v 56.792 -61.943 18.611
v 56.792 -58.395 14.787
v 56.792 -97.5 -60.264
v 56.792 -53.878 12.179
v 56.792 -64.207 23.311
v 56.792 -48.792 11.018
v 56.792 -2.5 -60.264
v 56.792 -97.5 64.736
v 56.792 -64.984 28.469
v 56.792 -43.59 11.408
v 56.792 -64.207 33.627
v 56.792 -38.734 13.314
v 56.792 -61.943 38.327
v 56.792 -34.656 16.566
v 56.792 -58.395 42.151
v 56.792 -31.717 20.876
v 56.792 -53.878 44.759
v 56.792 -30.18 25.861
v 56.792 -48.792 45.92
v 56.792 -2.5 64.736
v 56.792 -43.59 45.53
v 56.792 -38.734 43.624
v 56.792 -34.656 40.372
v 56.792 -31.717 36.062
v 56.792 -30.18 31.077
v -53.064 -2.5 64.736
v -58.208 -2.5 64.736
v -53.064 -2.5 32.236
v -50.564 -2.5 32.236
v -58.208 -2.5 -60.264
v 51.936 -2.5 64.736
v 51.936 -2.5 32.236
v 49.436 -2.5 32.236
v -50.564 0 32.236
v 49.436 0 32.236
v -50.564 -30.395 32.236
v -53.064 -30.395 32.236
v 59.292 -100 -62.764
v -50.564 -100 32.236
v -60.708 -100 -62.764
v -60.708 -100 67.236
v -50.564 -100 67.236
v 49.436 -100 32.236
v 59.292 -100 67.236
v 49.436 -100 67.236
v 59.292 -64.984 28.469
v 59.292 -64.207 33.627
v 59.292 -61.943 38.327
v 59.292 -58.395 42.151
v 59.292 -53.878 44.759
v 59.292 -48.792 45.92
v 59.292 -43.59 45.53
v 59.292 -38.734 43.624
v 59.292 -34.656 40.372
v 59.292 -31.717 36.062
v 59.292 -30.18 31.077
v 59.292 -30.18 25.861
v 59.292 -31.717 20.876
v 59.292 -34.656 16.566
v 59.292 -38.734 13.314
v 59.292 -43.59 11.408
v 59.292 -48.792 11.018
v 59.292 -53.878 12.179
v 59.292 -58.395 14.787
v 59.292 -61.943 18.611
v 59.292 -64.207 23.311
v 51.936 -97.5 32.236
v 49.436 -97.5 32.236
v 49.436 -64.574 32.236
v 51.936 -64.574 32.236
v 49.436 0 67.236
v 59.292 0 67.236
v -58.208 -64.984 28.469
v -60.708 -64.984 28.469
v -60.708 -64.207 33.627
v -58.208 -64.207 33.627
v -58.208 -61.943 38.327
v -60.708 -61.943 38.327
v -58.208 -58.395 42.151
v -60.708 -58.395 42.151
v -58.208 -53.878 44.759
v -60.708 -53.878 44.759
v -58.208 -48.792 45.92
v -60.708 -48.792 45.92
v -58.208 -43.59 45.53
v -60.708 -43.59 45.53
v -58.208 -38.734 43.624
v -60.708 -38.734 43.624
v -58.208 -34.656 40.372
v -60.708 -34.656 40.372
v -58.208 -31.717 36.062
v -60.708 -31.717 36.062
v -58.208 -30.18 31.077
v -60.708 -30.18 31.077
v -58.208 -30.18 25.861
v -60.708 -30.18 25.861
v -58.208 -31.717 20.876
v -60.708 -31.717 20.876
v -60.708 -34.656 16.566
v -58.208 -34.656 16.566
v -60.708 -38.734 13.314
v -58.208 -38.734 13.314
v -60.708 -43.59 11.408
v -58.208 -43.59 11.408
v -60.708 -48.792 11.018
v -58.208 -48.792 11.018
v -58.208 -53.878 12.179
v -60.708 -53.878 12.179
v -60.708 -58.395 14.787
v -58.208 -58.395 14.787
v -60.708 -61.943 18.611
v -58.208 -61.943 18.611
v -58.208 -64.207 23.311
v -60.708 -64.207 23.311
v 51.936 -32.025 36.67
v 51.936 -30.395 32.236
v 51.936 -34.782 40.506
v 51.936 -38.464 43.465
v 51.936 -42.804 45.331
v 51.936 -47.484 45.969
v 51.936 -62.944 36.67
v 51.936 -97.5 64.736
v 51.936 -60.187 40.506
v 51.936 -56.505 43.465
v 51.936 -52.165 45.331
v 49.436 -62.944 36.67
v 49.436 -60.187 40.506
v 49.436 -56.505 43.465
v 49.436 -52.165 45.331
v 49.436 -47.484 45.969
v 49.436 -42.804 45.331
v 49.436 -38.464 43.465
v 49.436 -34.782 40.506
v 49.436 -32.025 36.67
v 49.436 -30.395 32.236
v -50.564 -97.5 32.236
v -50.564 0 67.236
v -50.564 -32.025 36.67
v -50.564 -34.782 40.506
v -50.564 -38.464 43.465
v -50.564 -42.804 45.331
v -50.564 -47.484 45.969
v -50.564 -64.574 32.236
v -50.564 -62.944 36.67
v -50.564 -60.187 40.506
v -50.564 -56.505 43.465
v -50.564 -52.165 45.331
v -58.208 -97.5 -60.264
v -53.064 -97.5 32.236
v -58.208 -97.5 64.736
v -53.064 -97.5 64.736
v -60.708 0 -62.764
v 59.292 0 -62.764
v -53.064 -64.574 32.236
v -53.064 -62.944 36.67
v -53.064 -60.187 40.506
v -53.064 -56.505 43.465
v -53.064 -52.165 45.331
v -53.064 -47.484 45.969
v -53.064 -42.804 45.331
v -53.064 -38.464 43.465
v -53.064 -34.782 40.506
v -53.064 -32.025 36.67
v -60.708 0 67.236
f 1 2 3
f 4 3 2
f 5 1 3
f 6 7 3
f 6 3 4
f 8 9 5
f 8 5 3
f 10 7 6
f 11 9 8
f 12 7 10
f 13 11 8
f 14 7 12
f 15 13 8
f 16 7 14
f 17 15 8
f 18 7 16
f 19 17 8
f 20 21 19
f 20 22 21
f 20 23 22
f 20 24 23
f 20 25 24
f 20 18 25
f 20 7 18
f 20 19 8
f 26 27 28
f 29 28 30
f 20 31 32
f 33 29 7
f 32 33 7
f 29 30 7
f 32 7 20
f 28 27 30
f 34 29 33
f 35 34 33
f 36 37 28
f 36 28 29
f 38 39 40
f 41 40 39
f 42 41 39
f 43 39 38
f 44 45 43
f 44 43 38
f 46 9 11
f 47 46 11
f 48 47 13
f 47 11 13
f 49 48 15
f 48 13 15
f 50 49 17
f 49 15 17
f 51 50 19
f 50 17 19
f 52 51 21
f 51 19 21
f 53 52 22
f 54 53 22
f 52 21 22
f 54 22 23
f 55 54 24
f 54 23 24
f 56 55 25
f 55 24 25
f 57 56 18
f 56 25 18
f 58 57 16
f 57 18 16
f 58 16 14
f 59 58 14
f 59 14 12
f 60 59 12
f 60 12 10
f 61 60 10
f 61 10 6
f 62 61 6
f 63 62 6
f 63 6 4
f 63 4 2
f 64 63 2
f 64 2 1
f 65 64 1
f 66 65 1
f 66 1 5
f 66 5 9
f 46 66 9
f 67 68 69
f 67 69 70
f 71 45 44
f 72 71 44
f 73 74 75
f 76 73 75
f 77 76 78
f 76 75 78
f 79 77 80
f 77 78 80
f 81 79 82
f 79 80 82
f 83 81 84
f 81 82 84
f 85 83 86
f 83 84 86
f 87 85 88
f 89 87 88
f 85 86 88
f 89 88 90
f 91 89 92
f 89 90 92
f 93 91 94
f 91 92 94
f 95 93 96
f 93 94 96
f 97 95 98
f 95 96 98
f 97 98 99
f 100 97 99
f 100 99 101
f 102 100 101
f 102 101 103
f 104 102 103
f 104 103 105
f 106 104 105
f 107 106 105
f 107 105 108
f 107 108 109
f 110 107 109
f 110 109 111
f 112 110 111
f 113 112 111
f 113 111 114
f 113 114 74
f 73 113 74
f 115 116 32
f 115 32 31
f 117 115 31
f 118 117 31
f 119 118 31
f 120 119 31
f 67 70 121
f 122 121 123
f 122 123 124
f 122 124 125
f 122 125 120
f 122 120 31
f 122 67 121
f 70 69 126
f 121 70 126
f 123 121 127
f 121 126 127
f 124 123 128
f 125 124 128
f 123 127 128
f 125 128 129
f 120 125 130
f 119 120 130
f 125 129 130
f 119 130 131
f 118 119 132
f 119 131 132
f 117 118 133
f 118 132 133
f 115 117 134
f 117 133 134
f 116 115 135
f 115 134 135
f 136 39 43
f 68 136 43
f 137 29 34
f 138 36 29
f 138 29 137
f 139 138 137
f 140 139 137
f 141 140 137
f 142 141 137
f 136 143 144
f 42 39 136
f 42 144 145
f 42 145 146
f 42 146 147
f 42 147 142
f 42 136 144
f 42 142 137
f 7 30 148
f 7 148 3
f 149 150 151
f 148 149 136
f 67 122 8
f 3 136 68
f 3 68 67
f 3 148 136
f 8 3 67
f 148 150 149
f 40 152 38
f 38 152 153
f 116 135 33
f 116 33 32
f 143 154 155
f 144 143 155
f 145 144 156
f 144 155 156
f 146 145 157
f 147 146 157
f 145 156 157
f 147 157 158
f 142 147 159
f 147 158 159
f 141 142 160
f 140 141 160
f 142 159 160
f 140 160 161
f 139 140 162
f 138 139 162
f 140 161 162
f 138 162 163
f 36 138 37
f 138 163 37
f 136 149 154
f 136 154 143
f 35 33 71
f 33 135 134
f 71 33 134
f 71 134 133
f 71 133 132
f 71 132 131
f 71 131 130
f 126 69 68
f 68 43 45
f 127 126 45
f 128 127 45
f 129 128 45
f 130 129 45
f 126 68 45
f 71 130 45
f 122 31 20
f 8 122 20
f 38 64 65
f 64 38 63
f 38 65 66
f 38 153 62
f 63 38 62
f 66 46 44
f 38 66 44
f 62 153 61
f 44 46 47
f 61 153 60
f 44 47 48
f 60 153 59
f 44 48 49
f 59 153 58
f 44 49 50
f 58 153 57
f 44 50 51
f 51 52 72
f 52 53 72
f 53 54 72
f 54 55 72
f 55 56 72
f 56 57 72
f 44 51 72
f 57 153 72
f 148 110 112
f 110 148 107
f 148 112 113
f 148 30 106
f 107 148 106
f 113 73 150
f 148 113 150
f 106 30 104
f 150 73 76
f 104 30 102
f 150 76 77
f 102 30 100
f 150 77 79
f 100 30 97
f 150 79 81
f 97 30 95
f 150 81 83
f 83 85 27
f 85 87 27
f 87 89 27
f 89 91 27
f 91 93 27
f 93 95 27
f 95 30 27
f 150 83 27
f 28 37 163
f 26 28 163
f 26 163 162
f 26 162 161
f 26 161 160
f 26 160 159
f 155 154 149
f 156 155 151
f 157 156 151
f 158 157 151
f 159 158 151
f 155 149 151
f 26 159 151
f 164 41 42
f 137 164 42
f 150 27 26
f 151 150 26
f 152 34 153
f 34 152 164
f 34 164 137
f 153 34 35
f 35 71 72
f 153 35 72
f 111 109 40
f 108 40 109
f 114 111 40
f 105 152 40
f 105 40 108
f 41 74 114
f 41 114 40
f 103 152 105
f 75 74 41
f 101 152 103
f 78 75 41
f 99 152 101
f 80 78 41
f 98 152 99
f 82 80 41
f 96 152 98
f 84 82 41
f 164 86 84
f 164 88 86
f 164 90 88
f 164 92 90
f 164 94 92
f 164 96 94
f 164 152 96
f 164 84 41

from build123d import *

# Parameters (mm, degrees)
F0_W     = 120
F0_H     = 130
F1_DEPTH = 100
F2_W     = 100
F2_H     = 35
F3_DEPTH = 125
F4_T     = -2.5
F5_R     = 17.5
F6_DEPTH = 5005


# Not quite as in the source:
# - a shell that OpenCascade refuses in one call is made with other operations: the cavity is built on its own and cut out


with BuildPart() as f1:
    # F0 (on Front) → F1 (new body)
    with BuildSketch(Plane.XZ):
        with Locations((-0.7081851363, 2.2362722828)):
            Rectangle(F0_W, F0_H)
    extrude(amount=F1_DEPTH)

    # F2 (on face) → F3 (cut)
    with BuildSketch(Plane.XZ.offset(100)):
        with Locations((-0.5643002689, 49.7362722828)):
            Rectangle(F2_W, F2_H)
    extrude(amount=-F3_DEPTH, mode=Mode.SUBTRACT)

    # F4: a shell. OpenCascade refuses it in one call, so the cavity is built on its own and cut out:
    # the body offset inwards by the wall thickness, plus a prism from it out through each open face.
    f4_core = offset(f1.part, amount=F4_T, kind=Kind.INTERSECTION, mode=Mode.PRIVATE)
    f4_exits = [f4_core.faces().sort_by_distance(p)[0] for p in [
        (-0.5643, -50, 29.736272),
    ]]
    add(f4_core, mode=Mode.SUBTRACT)
    extrude(f4_exits, amount=-F4_T, mode=Mode.SUBTRACT)

    # F5 (on face) → F6 (cut)
    with BuildSketch(Plane(origin=(-60.7081851363, 0, 0), x_dir=(0, -1, 0), z_dir=(-1, 0, 0))):
        with Locations((47.4842637777, 28.4689757973)):
            Circle(F5_R)
    extrude(amount=-F6_DEPTH, mode=Mode.SUBTRACT)


solid = f1.part
